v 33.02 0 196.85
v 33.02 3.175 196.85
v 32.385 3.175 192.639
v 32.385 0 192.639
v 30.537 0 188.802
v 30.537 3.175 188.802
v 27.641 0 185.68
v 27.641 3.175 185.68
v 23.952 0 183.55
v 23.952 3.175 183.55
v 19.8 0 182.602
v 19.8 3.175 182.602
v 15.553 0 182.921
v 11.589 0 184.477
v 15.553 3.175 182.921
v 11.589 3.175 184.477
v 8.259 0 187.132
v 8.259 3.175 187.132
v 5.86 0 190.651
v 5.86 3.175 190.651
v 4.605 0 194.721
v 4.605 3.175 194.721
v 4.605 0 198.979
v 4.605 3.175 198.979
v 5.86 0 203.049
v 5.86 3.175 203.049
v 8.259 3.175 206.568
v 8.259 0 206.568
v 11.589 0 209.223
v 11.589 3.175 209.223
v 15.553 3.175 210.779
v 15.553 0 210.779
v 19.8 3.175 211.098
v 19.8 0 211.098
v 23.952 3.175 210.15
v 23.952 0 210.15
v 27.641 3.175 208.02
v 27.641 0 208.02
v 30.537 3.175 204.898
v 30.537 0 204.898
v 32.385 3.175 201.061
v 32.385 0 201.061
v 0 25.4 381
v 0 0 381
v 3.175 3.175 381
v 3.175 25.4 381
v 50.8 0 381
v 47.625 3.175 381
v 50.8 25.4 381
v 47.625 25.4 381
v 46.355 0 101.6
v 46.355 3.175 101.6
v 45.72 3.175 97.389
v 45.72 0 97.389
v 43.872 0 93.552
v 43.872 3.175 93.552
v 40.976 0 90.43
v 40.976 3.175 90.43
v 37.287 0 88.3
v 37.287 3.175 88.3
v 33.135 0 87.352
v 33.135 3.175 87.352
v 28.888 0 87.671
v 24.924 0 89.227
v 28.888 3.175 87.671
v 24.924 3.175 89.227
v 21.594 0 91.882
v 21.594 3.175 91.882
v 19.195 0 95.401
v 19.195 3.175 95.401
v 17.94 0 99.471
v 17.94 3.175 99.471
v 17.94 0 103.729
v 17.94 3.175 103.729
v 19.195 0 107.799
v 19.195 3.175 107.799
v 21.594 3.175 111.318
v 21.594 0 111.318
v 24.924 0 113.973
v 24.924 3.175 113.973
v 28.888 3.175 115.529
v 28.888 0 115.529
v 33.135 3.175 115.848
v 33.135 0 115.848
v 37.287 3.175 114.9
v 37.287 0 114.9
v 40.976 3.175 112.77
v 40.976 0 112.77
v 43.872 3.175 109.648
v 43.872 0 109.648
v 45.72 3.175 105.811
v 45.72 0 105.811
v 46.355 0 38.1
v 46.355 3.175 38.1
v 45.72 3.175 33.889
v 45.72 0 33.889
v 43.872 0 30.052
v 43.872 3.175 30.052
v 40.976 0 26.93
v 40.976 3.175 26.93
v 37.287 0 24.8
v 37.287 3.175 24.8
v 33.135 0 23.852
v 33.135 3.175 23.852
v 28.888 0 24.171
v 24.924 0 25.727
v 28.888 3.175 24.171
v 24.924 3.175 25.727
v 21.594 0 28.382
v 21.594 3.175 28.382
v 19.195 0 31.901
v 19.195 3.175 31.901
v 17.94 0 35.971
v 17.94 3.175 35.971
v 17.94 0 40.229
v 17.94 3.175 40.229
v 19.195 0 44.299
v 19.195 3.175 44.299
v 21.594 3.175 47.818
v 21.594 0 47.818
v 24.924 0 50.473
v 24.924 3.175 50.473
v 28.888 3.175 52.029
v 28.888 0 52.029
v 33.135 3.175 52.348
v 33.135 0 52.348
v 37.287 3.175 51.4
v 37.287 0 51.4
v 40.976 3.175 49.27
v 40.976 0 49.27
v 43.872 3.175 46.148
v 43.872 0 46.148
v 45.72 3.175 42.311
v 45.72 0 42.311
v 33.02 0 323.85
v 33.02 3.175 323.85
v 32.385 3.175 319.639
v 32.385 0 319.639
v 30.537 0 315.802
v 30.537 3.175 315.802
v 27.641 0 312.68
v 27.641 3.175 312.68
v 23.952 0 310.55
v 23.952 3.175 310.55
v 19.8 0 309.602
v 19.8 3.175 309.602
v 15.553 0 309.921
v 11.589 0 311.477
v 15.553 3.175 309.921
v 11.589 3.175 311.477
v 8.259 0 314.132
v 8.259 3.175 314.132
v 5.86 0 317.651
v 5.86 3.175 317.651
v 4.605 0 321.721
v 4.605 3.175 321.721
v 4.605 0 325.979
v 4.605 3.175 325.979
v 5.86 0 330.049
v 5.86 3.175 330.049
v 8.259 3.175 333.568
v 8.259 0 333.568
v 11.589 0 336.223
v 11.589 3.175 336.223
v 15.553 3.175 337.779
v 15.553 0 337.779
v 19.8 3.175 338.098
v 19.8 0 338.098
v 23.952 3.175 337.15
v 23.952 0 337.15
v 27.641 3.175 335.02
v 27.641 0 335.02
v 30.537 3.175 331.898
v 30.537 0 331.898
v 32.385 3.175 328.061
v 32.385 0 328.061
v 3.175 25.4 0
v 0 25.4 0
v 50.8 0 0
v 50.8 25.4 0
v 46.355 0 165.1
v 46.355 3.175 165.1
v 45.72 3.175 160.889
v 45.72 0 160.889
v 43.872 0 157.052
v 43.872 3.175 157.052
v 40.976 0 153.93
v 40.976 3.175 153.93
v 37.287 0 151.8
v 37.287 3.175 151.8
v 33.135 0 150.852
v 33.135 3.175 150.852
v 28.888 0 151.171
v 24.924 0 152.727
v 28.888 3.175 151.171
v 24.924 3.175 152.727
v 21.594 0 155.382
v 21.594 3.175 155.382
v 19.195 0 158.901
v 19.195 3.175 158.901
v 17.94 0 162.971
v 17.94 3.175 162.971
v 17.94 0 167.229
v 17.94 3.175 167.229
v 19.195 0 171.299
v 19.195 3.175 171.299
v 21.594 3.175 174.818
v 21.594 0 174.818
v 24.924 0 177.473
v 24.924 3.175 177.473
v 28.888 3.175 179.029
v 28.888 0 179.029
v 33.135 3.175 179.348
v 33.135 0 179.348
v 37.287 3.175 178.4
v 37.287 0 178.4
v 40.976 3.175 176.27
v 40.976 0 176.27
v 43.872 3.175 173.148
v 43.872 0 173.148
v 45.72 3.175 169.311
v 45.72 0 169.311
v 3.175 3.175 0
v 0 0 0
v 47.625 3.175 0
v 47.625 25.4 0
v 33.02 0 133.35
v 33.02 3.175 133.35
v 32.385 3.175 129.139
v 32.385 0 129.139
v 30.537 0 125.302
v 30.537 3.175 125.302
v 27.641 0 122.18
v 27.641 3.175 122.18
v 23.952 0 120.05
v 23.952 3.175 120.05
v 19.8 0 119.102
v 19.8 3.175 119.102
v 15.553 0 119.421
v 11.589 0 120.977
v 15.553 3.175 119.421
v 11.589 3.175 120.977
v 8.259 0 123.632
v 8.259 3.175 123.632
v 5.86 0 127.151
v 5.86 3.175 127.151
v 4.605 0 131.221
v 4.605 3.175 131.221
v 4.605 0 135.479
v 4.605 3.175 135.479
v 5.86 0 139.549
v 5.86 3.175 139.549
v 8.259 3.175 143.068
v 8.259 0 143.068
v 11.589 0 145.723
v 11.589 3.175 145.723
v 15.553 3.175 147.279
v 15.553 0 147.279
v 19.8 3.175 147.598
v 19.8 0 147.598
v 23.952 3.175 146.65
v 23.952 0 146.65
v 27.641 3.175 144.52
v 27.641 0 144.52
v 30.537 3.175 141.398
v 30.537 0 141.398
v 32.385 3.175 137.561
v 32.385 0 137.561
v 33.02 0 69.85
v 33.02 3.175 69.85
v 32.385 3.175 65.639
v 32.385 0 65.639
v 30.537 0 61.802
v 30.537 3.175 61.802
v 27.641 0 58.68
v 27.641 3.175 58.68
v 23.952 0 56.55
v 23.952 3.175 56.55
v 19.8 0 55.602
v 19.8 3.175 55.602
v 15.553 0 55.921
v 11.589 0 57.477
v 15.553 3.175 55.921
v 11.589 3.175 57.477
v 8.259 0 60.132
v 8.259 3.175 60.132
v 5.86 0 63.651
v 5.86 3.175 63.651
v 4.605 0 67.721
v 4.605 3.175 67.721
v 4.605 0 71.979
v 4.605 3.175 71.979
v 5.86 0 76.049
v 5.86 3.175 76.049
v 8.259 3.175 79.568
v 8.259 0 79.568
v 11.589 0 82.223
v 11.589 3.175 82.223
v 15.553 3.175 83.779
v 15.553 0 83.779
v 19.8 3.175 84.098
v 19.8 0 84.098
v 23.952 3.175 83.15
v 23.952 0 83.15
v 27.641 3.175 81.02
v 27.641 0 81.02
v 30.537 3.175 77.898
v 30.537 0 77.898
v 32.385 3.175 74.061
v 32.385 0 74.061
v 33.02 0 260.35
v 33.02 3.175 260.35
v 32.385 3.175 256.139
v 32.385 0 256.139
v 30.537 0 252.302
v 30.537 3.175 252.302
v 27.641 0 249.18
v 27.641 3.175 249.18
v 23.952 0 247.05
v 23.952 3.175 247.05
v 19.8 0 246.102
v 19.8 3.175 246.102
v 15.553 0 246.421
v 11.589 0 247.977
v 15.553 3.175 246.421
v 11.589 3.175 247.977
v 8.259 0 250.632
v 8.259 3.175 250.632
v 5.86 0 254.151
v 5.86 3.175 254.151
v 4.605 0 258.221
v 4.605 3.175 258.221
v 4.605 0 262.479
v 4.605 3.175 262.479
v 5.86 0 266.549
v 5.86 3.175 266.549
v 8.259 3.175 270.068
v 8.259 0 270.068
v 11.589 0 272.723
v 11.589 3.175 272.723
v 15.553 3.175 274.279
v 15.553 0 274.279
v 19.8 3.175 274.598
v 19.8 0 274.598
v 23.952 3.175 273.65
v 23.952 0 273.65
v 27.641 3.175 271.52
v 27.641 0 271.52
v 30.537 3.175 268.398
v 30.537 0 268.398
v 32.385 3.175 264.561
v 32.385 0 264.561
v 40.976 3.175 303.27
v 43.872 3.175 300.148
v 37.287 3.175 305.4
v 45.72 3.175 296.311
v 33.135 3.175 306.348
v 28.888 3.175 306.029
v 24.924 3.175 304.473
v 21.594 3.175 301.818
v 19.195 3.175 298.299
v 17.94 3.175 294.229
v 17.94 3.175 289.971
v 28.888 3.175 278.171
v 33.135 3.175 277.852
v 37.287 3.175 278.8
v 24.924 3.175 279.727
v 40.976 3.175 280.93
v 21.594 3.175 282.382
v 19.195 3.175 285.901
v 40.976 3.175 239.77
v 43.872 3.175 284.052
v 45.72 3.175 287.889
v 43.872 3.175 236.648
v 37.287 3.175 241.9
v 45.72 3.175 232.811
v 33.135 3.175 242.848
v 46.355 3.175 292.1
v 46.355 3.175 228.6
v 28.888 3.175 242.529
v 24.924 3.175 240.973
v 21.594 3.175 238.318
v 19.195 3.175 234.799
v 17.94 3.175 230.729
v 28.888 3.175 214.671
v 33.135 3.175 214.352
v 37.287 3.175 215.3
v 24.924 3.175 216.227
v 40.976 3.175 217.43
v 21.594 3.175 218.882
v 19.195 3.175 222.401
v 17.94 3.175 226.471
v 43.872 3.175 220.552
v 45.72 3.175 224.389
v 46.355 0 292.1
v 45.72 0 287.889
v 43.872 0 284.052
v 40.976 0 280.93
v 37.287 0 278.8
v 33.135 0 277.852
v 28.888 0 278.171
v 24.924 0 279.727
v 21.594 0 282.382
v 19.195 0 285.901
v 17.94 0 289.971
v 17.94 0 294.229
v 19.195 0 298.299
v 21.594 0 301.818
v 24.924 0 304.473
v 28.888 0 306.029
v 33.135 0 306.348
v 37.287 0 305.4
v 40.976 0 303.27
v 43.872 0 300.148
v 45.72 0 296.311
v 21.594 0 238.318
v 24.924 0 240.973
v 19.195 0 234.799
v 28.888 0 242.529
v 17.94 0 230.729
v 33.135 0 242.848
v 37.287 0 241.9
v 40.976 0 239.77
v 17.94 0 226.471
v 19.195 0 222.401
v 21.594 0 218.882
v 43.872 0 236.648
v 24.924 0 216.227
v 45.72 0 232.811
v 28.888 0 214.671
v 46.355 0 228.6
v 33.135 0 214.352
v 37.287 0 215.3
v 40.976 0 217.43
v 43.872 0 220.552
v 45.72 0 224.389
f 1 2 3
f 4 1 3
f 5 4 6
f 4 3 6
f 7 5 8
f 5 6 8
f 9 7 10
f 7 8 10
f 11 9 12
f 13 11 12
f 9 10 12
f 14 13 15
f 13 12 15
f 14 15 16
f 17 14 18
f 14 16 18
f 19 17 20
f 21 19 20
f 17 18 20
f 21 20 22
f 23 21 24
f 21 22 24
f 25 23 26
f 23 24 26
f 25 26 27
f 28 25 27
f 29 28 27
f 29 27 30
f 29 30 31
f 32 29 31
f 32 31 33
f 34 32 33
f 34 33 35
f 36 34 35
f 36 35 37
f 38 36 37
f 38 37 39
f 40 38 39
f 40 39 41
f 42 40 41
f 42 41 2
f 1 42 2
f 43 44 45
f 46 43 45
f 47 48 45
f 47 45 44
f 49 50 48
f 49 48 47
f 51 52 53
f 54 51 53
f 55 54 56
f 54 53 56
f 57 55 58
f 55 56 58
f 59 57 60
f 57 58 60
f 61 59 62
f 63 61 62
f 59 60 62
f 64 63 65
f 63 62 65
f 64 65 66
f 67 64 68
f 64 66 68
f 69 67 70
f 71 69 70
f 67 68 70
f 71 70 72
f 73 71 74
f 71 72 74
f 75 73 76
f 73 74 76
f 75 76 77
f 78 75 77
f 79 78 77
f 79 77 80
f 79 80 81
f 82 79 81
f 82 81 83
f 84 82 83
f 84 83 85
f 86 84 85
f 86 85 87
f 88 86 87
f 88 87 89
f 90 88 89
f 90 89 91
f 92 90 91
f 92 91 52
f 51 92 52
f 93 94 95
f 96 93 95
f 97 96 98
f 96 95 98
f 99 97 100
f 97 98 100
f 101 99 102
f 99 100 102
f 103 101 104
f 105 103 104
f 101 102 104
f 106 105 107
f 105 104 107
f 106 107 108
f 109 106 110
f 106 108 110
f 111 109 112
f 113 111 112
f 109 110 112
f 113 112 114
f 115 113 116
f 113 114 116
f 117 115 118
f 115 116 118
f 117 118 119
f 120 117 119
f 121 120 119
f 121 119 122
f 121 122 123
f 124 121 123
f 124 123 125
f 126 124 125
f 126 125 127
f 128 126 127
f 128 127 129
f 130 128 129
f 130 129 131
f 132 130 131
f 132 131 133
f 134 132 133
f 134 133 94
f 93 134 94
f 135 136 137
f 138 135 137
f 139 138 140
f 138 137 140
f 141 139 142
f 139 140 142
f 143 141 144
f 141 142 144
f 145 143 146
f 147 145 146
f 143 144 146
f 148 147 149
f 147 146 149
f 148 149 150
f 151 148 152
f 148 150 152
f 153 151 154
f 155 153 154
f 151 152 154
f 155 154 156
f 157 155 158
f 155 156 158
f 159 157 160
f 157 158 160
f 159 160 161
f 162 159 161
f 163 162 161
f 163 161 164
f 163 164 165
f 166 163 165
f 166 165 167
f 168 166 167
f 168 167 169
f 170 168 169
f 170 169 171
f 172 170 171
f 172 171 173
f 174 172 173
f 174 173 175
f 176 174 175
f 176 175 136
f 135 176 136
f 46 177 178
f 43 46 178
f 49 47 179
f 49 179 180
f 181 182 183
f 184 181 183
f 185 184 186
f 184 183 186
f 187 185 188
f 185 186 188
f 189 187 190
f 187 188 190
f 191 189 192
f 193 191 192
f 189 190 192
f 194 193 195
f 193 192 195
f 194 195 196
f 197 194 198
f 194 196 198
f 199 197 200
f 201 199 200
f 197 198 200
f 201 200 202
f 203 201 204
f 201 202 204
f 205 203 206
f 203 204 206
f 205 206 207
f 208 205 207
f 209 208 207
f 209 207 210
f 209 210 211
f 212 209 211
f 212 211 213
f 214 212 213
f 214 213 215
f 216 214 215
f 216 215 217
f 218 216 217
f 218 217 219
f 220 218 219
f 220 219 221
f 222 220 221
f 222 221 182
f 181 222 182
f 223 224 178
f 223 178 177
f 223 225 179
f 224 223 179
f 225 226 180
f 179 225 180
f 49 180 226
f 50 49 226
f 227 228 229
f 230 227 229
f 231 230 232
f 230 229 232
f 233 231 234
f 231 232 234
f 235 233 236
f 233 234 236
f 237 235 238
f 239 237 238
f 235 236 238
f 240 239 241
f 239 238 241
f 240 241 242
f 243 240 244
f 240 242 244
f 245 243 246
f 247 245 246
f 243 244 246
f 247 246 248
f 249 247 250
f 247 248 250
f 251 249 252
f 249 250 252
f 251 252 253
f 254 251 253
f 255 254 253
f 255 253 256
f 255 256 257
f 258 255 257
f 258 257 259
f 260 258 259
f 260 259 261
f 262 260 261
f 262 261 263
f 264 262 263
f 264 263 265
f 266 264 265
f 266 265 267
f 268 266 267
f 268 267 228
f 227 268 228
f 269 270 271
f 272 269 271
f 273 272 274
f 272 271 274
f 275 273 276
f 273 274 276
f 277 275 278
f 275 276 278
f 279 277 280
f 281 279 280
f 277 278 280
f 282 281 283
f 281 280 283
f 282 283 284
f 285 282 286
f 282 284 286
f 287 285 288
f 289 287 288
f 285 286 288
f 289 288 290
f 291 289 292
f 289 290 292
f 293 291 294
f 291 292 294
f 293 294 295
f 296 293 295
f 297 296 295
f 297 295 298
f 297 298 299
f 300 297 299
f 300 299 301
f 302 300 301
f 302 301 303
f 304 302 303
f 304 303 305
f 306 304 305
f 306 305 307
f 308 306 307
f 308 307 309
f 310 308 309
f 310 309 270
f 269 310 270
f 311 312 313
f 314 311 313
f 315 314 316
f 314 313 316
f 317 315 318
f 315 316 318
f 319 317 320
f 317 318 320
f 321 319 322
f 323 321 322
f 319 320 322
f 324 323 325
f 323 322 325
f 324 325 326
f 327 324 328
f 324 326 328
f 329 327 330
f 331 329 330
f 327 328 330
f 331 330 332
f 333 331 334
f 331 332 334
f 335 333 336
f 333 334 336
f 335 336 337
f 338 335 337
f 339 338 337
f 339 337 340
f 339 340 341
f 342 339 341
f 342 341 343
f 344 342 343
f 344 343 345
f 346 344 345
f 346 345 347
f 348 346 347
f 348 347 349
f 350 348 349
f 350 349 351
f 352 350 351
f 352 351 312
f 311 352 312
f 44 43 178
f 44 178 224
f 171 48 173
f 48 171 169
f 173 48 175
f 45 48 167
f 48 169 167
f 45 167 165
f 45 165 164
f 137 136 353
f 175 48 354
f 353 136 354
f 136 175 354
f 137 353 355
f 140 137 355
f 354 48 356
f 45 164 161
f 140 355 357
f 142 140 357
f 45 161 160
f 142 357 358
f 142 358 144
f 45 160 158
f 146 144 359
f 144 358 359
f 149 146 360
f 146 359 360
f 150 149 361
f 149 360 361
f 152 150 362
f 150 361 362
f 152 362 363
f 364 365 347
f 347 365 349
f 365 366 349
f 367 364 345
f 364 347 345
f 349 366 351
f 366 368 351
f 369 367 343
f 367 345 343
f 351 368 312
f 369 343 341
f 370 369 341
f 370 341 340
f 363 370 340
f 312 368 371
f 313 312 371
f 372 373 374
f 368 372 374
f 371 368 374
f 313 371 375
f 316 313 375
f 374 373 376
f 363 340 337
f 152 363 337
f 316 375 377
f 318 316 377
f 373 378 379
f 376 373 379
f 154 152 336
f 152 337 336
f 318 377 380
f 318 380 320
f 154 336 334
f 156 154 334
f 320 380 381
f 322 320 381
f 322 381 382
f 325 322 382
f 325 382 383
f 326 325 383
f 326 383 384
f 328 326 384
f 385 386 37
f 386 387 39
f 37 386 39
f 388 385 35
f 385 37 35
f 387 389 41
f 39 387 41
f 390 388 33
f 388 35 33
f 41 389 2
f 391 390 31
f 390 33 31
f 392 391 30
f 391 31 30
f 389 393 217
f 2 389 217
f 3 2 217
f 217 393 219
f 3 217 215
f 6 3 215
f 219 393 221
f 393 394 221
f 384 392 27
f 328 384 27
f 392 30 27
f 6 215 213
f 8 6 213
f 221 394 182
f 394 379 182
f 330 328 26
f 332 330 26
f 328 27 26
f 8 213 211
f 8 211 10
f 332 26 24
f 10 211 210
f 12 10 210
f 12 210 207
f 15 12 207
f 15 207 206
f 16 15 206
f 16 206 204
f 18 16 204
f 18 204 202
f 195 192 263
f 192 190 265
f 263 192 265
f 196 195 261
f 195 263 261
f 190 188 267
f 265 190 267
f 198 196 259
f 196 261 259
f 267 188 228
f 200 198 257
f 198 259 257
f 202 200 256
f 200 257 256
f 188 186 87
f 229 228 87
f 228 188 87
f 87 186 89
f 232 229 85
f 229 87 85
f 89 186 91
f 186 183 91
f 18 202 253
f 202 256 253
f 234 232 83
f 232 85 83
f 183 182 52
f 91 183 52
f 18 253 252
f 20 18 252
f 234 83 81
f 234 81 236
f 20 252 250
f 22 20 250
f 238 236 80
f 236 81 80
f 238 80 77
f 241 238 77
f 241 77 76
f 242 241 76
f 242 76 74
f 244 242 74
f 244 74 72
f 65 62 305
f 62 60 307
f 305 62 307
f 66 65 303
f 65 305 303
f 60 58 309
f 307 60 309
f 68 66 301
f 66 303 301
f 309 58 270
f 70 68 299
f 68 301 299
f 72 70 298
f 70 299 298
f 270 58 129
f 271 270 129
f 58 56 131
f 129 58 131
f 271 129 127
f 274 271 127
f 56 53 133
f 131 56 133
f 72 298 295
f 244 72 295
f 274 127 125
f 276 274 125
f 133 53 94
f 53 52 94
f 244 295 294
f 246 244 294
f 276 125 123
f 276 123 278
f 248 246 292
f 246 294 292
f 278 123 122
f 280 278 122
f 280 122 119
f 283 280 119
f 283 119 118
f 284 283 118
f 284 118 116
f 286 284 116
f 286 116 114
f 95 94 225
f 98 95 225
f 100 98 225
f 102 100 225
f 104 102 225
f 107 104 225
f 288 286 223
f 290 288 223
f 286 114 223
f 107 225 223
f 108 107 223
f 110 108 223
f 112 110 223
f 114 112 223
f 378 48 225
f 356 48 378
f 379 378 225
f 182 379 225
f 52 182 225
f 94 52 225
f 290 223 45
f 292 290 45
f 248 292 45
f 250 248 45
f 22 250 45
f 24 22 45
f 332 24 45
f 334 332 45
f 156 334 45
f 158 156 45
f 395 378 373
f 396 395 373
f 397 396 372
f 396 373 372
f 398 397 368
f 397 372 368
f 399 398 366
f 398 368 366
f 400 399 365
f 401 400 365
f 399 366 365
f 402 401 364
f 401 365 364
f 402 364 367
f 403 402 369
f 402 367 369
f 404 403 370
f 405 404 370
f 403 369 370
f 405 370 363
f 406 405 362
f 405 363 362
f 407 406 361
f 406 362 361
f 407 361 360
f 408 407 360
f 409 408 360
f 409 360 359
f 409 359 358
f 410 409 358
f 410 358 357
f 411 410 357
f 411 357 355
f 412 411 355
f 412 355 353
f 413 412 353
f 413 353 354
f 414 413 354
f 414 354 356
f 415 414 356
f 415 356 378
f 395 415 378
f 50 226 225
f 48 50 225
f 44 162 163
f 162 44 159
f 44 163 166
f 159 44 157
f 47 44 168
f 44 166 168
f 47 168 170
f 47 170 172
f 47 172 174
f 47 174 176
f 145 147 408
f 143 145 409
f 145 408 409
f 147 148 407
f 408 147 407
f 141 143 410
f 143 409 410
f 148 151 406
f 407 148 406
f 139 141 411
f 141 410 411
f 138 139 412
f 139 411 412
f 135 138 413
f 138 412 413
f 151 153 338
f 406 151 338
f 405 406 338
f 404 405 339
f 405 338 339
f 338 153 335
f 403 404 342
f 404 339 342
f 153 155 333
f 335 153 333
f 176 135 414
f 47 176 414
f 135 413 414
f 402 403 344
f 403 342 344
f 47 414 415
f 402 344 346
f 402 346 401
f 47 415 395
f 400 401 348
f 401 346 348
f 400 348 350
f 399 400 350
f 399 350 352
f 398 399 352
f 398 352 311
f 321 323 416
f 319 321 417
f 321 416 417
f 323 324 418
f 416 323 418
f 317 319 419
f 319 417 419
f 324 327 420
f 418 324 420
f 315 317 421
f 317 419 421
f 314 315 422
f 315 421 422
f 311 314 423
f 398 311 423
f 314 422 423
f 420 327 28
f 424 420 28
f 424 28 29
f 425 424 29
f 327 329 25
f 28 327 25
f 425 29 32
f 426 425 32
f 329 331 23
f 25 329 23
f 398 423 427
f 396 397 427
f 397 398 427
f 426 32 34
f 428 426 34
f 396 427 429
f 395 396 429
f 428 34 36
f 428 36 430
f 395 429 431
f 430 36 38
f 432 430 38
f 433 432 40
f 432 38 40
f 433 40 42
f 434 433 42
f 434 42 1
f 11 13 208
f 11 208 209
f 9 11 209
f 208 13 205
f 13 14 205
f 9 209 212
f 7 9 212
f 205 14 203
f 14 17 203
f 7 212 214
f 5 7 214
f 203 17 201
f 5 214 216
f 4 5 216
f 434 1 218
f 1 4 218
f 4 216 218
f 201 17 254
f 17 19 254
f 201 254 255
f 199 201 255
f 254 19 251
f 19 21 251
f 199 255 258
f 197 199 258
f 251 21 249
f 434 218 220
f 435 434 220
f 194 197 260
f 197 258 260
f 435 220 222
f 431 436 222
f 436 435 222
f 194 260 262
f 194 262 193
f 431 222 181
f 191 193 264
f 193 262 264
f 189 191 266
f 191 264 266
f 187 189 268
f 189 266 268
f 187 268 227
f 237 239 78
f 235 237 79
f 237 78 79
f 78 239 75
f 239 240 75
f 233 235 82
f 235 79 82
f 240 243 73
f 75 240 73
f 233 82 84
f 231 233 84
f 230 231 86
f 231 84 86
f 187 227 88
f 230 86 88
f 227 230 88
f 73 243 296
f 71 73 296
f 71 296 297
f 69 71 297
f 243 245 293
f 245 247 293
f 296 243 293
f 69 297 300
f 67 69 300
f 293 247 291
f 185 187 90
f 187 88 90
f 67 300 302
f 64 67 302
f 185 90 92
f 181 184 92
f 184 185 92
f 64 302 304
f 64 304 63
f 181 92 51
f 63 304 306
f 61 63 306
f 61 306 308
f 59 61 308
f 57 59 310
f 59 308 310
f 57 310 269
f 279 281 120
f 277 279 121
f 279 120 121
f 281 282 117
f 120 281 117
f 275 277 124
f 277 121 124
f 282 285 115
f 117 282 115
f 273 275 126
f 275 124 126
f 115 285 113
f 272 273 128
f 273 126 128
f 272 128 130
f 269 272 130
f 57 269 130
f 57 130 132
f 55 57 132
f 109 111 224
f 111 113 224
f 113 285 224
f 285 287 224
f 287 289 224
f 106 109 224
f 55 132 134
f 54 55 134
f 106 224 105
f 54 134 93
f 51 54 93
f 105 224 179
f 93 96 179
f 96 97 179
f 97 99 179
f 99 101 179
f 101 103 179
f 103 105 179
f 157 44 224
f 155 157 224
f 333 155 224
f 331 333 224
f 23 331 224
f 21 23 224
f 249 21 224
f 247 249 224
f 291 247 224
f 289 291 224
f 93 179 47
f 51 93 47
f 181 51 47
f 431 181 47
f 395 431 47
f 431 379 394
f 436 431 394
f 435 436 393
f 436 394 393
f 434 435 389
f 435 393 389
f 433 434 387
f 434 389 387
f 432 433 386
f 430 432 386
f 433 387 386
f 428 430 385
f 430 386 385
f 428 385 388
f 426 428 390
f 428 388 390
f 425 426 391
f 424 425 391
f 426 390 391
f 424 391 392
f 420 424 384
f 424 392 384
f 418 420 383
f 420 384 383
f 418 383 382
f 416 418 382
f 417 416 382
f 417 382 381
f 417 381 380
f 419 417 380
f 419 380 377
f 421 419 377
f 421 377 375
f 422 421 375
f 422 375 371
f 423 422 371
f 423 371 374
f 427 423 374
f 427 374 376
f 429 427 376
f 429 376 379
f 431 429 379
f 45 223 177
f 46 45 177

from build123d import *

# Parameters (mm, degrees)
BOSS_EXTRUDE1_DEPTH = 381
CUT_EXTRUDE1_REACH  = 5.175
SKETCH2_R           = 14.2875


with BuildPart() as part:
    # Sketch1 → Boss-Extrude1 (new body)
    with BuildSketch(Plane.XY):
        Polygon((3.175, 3.175), (3.175, 25.4), (0, 25.4), (0, 0), (50.8, 0), (50.8, 25.4), (47.625, 25.4), (47.625, 3.175), align=None)
    extrude(amount=BOSS_EXTRUDE1_DEPTH)

    # Sketch2 → Cut-Extrude1 (cut, up to next)
    with BuildSketch(Plane(origin=(0, 3.175, 0), x_dir=(1, 0, 0), z_dir=(0, 1, 0)), mode=Mode.PRIVATE) as cut_extrude1_sk1:
        with Locations((32.0675, -38.1)):
            Circle(SKETCH2_R)
    cut_extrude1_tool1 = extrude(cut_extrude1_sk1.sketch, amount=-CUT_EXTRUDE1_REACH, mode=Mode.PRIVATE) & part.part
    add(cut_extrude1_tool1.solids().sort_by_distance((32.0675, 3.175, 38.1))[0], mode=Mode.SUBTRACT)
    # Sketch2 → Cut-Extrude1 (cut, up to next)
    with BuildSketch(Plane(origin=(0, 3.175, 0), x_dir=(1, 0, 0), z_dir=(0, 1, 0)), mode=Mode.PRIVATE) as cut_extrude1_sk2:
        with Locations((18.7325, -69.85)):
            Circle(SKETCH2_R)
    cut_extrude1_tool2 = extrude(cut_extrude1_sk2.sketch, amount=-CUT_EXTRUDE1_REACH, mode=Mode.PRIVATE) & part.part
    add(cut_extrude1_tool2.solids().sort_by_distance((18.7325, 3.175, 69.85))[0], mode=Mode.SUBTRACT)
    # Sketch2 → Cut-Extrude1 (cut, up to next)
    with BuildSketch(Plane(origin=(0, 3.175, 0), x_dir=(1, 0, 0), z_dir=(0, 1, 0)), mode=Mode.PRIVATE) as cut_extrude1_sk3:
        with Locations((18.7325, -133.35)):
            Circle(SKETCH2_R)
    cut_extrude1_tool3 = extrude(cut_extrude1_sk3.sketch, amount=-CUT_EXTRUDE1_REACH, mode=Mode.PRIVATE) & part.part
    add(cut_extrude1_tool3.solids().sort_by_distance((18.7325, 3.175, 133.35))[0], mode=Mode.SUBTRACT)
    # Sketch2 → Cut-Extrude1 (cut, up to next)
    with BuildSketch(Plane(origin=(0, 3.175, 0), x_dir=(1, 0, 0), z_dir=(0, 1, 0)), mode=Mode.PRIVATE) as cut_extrude1_sk4:
        with Locations((32.0675, -101.6)):
            Circle(SKETCH2_R)
    cut_extrude1_tool4 = extrude(cut_extrude1_sk4.sketch, amount=-CUT_EXTRUDE1_REACH, mode=Mode.PRIVATE) & part.part
    add(cut_extrude1_tool4.solids().sort_by_distance((32.0675, 3.175, 101.6))[0], mode=Mode.SUBTRACT)
    # Sketch2 → Cut-Extrude1 (cut, up to next)
    with BuildSketch(Plane(origin=(0, 3.175, 0), x_dir=(1, 0, 0), z_dir=(0, 1, 0)), mode=Mode.PRIVATE) as cut_extrude1_sk5:
        with Locations((18.7325, -196.85)):
            Circle(SKETCH2_R)
    cut_extrude1_tool5 = extrude(cut_extrude1_sk5.sketch, amount=-CUT_EXTRUDE1_REACH, mode=Mode.PRIVATE) & part.part
    add(cut_extrude1_tool5.solids().sort_by_distance((18.7325, 3.175, 196.85))[0], mode=Mode.SUBTRACT)
    # Sketch2 → Cut-Extrude1 (cut, up to next)
    with BuildSketch(Plane(origin=(0, 3.175, 0), x_dir=(1, 0, 0), z_dir=(0, 1, 0)), mode=Mode.PRIVATE) as cut_extrude1_sk6:
        with Locations((32.0675, -165.1)):
            Circle(SKETCH2_R)
    cut_extrude1_tool6 = extrude(cut_extrude1_sk6.sketch, amount=-CUT_EXTRUDE1_REACH, mode=Mode.PRIVATE) & part.part
    add(cut_extrude1_tool6.solids().sort_by_distance((32.0675, 3.175, 165.1))[0], mode=Mode.SUBTRACT)
    # Sketch2 → Cut-Extrude1 (cut, up to next)
    with BuildSketch(Plane(origin=(0, 3.175, 0), x_dir=(1, 0, 0), z_dir=(0, 1, 0)), mode=Mode.PRIVATE) as cut_extrude1_sk7:
        with Locations((18.7325, -260.35)):
            Circle(SKETCH2_R)
    cut_extrude1_tool7 = extrude(cut_extrude1_sk7.sketch, amount=-CUT_EXTRUDE1_REACH, mode=Mode.PRIVATE) & part.part
    add(cut_extrude1_tool7.solids().sort_by_distance((18.7325, 3.175, 260.35))[0], mode=Mode.SUBTRACT)
    # Sketch2 → Cut-Extrude1 (cut, up to next)
    with BuildSketch(Plane(origin=(0, 3.175, 0), x_dir=(1, 0, 0), z_dir=(0, 1, 0)), mode=Mode.PRIVATE) as cut_extrude1_sk8:
        with Locations((32.0675, -228.6)):
            Circle(SKETCH2_R)
    cut_extrude1_tool8 = extrude(cut_extrude1_sk8.sketch, amount=-CUT_EXTRUDE1_REACH, mode=Mode.PRIVATE) & part.part
    add(cut_extrude1_tool8.solids().sort_by_distance((32.0675, 3.175, 228.6))[0], mode=Mode.SUBTRACT)
    # Sketch2 → Cut-Extrude1 (cut, up to next)
    with BuildSketch(Plane(origin=(0, 3.175, 0), x_dir=(1, 0, 0), z_dir=(0, 1, 0)), mode=Mode.PRIVATE) as cut_extrude1_sk9:
        with Locations((18.7325, -323.85)):
            Circle(SKETCH2_R)
    cut_extrude1_tool9 = extrude(cut_extrude1_sk9.sketch, amount=-CUT_EXTRUDE1_REACH, mode=Mode.PRIVATE) & part.part
    add(cut_extrude1_tool9.solids().sort_by_distance((18.7325, 3.175, 323.85))[0], mode=Mode.SUBTRACT)
    # Sketch2 → Cut-Extrude1 (cut, up to next)
    with BuildSketch(Plane(origin=(0, 3.175, 0), x_dir=(1, 0, 0), z_dir=(0, 1, 0)), mode=Mode.PRIVATE) as cut_extrude1_sk10:
        with Locations((32.0675, -292.1)):
            Circle(SKETCH2_R)
    cut_extrude1_tool10 = extrude(cut_extrude1_sk10.sketch, amount=-CUT_EXTRUDE1_REACH, mode=Mode.PRIVATE) & part.part
    add(cut_extrude1_tool10.solids().sort_by_distance((32.0675, 3.175, 292.1))[0], mode=Mode.SUBTRACT)


solid = part.part
